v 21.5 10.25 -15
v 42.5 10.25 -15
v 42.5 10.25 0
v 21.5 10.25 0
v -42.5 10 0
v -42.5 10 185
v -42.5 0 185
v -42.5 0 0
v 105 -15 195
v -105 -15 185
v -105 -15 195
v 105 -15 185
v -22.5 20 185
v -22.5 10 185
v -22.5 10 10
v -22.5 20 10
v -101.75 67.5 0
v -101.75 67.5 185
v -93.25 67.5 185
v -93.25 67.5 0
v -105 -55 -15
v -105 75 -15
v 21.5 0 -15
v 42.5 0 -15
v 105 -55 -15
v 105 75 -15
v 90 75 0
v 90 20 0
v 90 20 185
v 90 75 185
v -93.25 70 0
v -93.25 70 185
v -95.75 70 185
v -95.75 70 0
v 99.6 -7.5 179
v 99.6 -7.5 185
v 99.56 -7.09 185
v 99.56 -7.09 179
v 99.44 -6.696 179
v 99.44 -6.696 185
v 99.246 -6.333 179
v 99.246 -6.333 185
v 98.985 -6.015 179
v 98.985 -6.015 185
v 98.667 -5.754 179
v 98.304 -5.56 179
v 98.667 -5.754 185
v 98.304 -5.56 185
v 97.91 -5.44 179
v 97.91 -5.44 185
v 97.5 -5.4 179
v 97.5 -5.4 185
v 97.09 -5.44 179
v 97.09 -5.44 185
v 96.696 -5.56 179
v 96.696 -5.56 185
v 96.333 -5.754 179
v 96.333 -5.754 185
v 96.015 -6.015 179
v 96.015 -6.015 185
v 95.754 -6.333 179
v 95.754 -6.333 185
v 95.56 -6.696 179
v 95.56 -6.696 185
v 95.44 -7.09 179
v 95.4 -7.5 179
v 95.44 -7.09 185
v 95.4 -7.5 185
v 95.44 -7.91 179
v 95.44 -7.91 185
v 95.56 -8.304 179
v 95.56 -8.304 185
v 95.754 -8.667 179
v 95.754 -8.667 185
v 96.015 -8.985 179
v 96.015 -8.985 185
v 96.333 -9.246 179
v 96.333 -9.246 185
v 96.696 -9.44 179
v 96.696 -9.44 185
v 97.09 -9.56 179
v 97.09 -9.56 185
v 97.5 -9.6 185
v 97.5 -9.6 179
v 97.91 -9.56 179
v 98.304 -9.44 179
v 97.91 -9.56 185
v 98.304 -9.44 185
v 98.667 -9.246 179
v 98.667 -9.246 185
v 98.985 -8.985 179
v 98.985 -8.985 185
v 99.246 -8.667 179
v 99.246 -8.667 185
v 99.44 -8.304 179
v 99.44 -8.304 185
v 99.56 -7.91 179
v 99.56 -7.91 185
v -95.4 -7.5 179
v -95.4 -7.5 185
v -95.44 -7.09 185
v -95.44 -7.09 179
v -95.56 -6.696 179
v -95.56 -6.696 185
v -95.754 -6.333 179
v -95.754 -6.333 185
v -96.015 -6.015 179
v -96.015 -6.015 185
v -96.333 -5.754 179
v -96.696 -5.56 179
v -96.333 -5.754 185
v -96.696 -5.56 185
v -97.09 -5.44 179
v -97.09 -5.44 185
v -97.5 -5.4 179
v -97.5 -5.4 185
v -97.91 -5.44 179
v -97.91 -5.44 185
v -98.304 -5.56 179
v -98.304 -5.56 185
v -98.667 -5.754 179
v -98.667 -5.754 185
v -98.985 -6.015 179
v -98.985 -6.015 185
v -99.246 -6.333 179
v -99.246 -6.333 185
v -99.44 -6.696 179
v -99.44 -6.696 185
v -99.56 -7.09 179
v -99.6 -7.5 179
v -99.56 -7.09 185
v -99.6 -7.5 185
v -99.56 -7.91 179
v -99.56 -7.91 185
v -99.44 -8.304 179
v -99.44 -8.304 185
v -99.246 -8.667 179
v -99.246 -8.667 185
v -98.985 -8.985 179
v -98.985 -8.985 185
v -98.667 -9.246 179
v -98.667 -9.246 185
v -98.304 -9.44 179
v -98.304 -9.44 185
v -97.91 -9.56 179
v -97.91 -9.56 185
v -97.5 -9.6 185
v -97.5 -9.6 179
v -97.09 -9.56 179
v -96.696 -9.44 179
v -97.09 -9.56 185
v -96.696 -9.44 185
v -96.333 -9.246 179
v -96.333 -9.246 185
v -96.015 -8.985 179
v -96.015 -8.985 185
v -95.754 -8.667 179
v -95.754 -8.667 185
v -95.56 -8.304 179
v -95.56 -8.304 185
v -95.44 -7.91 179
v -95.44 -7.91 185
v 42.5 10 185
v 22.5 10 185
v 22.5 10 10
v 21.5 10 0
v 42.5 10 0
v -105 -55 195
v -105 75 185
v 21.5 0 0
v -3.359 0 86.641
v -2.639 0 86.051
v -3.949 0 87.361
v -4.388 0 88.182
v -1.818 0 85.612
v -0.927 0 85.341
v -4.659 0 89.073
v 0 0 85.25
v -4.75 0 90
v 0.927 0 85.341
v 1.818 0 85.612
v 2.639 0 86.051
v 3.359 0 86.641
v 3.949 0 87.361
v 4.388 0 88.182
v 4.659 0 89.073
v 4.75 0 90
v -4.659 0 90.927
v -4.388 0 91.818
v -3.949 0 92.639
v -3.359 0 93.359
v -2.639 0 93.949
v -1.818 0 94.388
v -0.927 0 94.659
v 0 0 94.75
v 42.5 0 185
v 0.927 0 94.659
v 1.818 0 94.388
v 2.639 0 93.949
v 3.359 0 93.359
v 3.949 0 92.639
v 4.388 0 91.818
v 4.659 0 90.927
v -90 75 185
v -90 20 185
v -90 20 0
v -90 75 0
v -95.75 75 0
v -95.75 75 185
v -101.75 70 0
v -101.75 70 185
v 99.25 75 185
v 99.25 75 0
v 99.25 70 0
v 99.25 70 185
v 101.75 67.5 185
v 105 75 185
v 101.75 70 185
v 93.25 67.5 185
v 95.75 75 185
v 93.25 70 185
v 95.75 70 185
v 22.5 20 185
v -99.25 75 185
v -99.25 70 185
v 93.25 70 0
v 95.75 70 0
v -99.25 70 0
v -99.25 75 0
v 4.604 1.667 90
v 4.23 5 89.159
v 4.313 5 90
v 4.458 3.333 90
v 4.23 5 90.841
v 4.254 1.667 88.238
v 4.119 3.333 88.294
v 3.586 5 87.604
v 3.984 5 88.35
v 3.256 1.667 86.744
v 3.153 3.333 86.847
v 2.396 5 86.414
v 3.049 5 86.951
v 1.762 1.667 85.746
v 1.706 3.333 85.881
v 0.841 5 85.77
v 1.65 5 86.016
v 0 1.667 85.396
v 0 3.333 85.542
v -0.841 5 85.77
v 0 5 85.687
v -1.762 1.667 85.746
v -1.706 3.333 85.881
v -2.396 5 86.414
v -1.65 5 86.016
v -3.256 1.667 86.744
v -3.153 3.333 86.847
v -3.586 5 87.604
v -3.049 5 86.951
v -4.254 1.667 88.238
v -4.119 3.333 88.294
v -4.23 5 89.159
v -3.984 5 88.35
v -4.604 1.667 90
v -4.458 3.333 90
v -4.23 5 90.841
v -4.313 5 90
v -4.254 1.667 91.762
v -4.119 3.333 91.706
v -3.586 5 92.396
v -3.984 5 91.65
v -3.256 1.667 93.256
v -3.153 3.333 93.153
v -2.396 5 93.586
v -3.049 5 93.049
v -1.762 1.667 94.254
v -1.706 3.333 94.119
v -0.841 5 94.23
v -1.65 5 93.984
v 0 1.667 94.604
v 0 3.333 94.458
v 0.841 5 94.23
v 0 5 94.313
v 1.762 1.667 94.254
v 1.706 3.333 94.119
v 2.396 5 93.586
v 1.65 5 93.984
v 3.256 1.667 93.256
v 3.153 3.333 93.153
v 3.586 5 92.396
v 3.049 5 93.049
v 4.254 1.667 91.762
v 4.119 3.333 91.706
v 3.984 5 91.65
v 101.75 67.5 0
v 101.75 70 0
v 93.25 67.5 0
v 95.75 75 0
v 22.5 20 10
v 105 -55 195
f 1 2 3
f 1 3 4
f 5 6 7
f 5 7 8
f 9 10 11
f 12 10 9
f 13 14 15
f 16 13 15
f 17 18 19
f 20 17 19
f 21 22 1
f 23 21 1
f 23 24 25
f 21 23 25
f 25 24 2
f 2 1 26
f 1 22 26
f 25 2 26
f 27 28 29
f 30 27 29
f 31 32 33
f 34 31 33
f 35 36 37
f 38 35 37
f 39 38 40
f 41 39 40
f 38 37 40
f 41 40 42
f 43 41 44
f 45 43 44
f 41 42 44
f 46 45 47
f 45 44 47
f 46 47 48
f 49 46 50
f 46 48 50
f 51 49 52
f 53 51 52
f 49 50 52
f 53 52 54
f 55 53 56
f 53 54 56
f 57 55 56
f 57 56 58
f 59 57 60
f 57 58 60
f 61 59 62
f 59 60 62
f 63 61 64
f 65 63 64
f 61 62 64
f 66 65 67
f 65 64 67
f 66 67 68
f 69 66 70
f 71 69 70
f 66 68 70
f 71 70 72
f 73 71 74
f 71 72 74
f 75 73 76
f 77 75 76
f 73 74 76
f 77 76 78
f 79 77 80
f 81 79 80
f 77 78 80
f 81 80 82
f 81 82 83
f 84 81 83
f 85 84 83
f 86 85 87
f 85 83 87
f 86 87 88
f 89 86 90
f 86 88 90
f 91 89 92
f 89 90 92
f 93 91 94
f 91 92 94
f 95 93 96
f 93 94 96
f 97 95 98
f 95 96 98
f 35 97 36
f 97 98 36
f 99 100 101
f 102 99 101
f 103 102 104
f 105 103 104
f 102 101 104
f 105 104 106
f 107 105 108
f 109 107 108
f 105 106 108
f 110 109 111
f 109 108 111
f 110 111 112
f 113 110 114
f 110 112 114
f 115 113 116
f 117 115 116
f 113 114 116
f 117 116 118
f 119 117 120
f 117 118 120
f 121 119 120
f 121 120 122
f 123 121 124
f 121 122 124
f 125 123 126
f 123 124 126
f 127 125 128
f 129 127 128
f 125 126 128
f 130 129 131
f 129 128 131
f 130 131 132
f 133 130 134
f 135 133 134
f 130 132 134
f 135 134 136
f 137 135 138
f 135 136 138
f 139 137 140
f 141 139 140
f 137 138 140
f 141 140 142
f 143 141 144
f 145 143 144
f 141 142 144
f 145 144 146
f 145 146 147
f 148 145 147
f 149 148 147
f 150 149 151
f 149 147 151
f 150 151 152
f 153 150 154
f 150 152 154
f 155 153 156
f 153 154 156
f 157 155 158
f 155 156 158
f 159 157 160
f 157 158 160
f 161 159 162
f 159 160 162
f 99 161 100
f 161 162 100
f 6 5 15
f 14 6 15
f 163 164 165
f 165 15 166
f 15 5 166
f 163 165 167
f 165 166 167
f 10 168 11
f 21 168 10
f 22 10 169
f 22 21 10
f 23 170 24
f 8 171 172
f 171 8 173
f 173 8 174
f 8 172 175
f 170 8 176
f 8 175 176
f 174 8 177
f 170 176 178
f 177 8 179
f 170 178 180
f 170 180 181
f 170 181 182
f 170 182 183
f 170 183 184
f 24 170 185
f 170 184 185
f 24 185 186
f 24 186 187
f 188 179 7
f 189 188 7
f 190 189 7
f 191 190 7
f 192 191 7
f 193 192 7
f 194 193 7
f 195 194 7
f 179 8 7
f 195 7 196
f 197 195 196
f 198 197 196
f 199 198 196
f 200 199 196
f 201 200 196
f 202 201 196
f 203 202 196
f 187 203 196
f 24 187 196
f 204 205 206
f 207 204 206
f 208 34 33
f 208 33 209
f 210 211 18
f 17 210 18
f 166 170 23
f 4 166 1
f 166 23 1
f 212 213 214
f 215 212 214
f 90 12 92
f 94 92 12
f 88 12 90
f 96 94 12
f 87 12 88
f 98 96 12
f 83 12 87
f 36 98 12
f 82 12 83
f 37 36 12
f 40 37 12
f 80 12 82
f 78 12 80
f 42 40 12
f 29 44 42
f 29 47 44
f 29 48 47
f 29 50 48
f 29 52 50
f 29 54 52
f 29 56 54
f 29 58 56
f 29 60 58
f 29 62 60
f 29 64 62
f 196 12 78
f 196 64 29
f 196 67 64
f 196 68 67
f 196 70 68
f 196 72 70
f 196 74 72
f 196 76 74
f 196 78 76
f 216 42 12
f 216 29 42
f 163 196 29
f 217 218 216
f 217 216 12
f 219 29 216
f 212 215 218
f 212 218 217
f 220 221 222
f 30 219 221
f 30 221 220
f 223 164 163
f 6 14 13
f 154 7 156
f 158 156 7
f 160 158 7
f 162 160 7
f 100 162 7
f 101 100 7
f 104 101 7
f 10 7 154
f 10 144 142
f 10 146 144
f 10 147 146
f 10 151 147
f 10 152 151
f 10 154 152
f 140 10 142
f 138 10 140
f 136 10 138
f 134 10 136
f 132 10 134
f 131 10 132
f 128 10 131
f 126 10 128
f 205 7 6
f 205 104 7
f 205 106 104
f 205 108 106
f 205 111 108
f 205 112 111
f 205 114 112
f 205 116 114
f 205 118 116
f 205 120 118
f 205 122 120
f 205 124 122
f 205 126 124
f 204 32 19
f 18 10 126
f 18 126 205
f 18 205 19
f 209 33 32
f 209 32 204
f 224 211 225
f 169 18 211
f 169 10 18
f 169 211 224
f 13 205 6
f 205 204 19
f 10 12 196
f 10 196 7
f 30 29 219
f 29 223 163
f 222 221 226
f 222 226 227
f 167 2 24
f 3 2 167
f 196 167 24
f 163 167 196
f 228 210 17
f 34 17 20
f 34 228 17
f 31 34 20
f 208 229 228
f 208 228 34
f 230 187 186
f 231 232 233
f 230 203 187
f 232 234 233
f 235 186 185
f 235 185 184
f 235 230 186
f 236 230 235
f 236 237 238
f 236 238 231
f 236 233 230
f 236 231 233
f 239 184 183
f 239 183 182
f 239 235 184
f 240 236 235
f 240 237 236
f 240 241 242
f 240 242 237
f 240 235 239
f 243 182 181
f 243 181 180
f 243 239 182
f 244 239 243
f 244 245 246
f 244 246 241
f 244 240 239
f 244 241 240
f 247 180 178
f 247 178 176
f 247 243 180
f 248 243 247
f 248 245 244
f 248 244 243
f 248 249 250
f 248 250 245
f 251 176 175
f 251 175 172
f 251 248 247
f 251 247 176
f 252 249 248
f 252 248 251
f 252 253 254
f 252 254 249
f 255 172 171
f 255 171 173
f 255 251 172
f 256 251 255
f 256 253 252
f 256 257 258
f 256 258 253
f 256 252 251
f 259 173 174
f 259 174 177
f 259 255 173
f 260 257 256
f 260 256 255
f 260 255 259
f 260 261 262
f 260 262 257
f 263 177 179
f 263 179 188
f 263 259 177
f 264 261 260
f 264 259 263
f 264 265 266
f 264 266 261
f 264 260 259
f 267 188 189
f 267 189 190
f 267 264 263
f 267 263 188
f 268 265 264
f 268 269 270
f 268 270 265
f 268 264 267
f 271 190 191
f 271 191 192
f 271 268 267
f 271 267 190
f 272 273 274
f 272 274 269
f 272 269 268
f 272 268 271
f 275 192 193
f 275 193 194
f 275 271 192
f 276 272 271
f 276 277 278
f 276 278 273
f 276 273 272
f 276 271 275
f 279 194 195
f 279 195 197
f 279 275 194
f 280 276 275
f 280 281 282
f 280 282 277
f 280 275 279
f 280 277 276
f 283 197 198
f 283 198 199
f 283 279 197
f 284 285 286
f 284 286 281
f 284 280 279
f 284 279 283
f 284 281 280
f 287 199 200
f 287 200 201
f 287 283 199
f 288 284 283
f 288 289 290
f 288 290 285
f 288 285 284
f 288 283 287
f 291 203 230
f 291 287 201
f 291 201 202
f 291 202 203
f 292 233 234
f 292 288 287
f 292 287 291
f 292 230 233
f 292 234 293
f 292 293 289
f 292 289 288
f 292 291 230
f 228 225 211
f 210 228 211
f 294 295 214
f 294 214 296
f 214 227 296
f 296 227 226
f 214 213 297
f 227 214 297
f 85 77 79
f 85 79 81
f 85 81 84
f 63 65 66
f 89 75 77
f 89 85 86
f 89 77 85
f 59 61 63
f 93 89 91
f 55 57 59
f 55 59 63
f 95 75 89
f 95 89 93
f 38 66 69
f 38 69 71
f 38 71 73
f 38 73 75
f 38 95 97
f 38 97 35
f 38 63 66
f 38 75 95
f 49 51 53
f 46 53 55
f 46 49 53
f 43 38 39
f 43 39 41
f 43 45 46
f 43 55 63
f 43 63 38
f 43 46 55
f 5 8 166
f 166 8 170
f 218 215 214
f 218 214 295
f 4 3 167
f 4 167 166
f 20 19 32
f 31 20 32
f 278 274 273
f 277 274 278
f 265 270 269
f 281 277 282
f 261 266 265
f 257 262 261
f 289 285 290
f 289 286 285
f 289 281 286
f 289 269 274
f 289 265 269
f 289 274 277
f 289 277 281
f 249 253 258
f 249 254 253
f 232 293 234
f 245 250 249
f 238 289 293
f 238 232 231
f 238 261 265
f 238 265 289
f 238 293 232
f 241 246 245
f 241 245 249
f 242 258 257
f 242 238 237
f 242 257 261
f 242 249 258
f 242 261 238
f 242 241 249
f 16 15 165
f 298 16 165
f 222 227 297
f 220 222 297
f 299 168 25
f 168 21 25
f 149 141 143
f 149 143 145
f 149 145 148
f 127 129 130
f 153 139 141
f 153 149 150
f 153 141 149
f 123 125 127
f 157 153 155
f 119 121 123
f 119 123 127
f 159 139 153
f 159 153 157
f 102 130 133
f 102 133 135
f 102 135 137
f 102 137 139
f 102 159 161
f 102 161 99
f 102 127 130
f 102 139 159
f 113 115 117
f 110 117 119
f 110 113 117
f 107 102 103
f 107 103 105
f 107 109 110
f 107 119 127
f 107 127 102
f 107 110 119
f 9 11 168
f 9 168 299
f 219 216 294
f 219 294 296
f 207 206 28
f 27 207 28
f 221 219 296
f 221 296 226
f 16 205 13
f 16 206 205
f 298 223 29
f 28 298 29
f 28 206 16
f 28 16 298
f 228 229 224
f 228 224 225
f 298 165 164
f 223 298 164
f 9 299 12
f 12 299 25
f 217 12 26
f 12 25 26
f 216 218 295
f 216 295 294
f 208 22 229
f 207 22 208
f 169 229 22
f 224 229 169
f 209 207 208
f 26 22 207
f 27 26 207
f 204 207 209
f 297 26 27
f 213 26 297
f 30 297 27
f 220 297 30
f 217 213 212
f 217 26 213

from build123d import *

# Parameters (mm, degrees)
BOSS_EXTRUDE1_DEPTH = 225
BOSS_EXTRUDE2_DEPTH = 10
SKETCH6_W           = 210
SKETCH6_H           = 200
BOSS_EXTRUDE3_DEPTH = 15
SKETCH5_R           = 2.1
CUT_EXTRUDE1_DEPTH  = 6
SKETCH10_W          = 210
SKETCH10_H          = 200
BOSS_EXTRUDE4_DEPTH = 40
SKETCH11_R          = 4.75
BOSS_EXTRUDE5_DEPTH = 5
BOSS_EXTRUDE5_TAPER = 5
SKETCH13_W          = 185
SKETCH13_H          = 10
BOSS_EXTRUDE6_DEPTH = 47.5
SKETCH14_W          = 185
SKETCH14_H          = 10
BOSS_EXTRUDE7_DEPTH = 47.5
SKETCH7_W           = 21
SKETCH7_H           = 10.25
CUT_EXTRUDE2_DEPTH  = 15
SKETCH15_R          = 2.1
CUT_EXTRUDE4_DEPTH  = 4.5
CUT_EXTRUDE5_DEPTH  = 185
SKETCH17_W          = 210
SKETCH17_H          = 40
BOSS_EXTRUDE8_DEPTH = 10


with BuildPart() as part:
    # Sketch2 → Boss-Extrude1 (new body)
    with BuildSketch(Plane(origin=(0, 0, 0), x_dir=(1, 0, 0), z_dir=(0, 1, 0))):
        Polygon((-90, 0), (90, 0), (90, -185), (105, -185), (105, 15), (-105, 15), (-105, -185), (-90, -185), align=None)
    extrude(amount=BOSS_EXTRUDE1_DEPTH)

    # Sketch3 → Boss-Extrude2 (add)
    with BuildSketch(Plane(origin=(0, 10, 0), x_dir=(1, 0, 0), z_dir=(0, 1, 0))):
        Polygon((-90, -185), (-22.5, -185), (-22.5, -10), (22.5, -10), (22.5, -185), (90, -185), (90, 0), (-90, 0), align=None)
    extrude(amount=BOSS_EXTRUDE2_DEPTH)

    # Sketch6 → Boss-Extrude3 (add)
    with BuildSketch(Plane.XZ):
        with Locations((0, 85)):
            Rectangle(SKETCH6_W, SKETCH6_H)
    extrude(amount=BOSS_EXTRUDE3_DEPTH)

    # Sketch5 → Cut-Extrude1 (cut)
    with BuildSketch(Plane.XY.offset(185)):
        with Locations((-97.5, 217.5)):
            Circle(SKETCH5_R)
        with Locations((97.5, 217.5)):
            Circle(SKETCH5_R)
        with Locations((-97.5, -7.5)):
            Circle(SKETCH5_R)
        with Locations((97.5, -7.5)):
            Circle(SKETCH5_R)
    extrude(amount=-CUT_EXTRUDE1_DEPTH, mode=Mode.SUBTRACT)

    # Sketch10 → Boss-Extrude4 (add)
    with BuildSketch(Plane.XZ.offset(15)):
        with Locations((0, 85)):
            Rectangle(SKETCH10_W, SKETCH10_H)
    extrude(amount=BOSS_EXTRUDE4_DEPTH)

    # Sketch11 → Boss-Extrude5 (add)
    with BuildSketch(Plane(origin=(0, 0, 0), x_dir=(1, 0, 0), z_dir=(0, 1, 0))):
        with Locations((0, -90)):
            Circle(SKETCH11_R)
    extrude(amount=BOSS_EXTRUDE5_DEPTH, taper=BOSS_EXTRUDE5_TAPER)

    # Sketch13 → Boss-Extrude6 (add)
    with BuildSketch(Plane.ZY.offset(-90)):
        with Locations((92.5, 5)):
            Rectangle(SKETCH13_W, SKETCH13_H)
    extrude(amount=BOSS_EXTRUDE6_DEPTH)

    # Sketch14 → Boss-Extrude7 (add)
    with BuildSketch(Plane(origin=(-90, 0, 0), x_dir=(0, 0, -1), z_dir=(1, 0, 0))):
        with Locations((-92.5, 5)):
            Rectangle(SKETCH14_W, SKETCH14_H)
    extrude(amount=BOSS_EXTRUDE7_DEPTH)

    # Sketch7 → Cut-Extrude2 (cut)
    with BuildSketch(Plane(origin=(0, 0, -15), x_dir=(-1, 0, 0), z_dir=(0, 0, -1))):
        with Locations((-32, 5.125)):
            Rectangle(SKETCH7_W, SKETCH7_H)
    extrude(amount=-CUT_EXTRUDE2_DEPTH, mode=Mode.SUBTRACT)

    # Sketch15 → Cut-Extrude4 (cut)
    with BuildSketch(Plane(origin=(0, 225, 0), x_dir=(1, 0, 0), z_dir=(0, 1, 0))):
        with Locations((0, 7.5)):
            Circle(SKETCH15_R)
        with Locations((-97.5, -90)):
            Circle(SKETCH15_R)
        with Locations((97.5, -90)):
            Circle(SKETCH15_R)
    extrude(amount=-CUT_EXTRUDE4_DEPTH, mode=Mode.SUBTRACT)

    # Split1
    split(bisect_by=Plane.ZX.offset(75), keep=Keep.BOTTOM)

    # Sketch16 → Cut-Extrude5 (cut)
    with BuildSketch(Plane.XY.offset(185)):
        Polygon((-99.25, 75), (-99.25, 70), (-101.75, 70), (-101.75, 67.5), (-93.25, 67.5), (-93.25, 70), (-95.75, 70), (-95.75, 75), align=None)
        Polygon((95.75, 70), (95.75, 75), (99.25, 75), (99.25, 70), (101.75, 70), (101.75, 67.5), (93.25, 67.5), (93.25, 70), align=None)
    extrude(amount=-CUT_EXTRUDE5_DEPTH, mode=Mode.SUBTRACT)

    # Sketch17 → Boss-Extrude8 (add)
    with BuildSketch(Plane.XY.offset(185)):
        with Locations((0, -35)):
            Rectangle(SKETCH17_W, SKETCH17_H)
    extrude(amount=BOSS_EXTRUDE8_DEPTH)


solid = part.part
